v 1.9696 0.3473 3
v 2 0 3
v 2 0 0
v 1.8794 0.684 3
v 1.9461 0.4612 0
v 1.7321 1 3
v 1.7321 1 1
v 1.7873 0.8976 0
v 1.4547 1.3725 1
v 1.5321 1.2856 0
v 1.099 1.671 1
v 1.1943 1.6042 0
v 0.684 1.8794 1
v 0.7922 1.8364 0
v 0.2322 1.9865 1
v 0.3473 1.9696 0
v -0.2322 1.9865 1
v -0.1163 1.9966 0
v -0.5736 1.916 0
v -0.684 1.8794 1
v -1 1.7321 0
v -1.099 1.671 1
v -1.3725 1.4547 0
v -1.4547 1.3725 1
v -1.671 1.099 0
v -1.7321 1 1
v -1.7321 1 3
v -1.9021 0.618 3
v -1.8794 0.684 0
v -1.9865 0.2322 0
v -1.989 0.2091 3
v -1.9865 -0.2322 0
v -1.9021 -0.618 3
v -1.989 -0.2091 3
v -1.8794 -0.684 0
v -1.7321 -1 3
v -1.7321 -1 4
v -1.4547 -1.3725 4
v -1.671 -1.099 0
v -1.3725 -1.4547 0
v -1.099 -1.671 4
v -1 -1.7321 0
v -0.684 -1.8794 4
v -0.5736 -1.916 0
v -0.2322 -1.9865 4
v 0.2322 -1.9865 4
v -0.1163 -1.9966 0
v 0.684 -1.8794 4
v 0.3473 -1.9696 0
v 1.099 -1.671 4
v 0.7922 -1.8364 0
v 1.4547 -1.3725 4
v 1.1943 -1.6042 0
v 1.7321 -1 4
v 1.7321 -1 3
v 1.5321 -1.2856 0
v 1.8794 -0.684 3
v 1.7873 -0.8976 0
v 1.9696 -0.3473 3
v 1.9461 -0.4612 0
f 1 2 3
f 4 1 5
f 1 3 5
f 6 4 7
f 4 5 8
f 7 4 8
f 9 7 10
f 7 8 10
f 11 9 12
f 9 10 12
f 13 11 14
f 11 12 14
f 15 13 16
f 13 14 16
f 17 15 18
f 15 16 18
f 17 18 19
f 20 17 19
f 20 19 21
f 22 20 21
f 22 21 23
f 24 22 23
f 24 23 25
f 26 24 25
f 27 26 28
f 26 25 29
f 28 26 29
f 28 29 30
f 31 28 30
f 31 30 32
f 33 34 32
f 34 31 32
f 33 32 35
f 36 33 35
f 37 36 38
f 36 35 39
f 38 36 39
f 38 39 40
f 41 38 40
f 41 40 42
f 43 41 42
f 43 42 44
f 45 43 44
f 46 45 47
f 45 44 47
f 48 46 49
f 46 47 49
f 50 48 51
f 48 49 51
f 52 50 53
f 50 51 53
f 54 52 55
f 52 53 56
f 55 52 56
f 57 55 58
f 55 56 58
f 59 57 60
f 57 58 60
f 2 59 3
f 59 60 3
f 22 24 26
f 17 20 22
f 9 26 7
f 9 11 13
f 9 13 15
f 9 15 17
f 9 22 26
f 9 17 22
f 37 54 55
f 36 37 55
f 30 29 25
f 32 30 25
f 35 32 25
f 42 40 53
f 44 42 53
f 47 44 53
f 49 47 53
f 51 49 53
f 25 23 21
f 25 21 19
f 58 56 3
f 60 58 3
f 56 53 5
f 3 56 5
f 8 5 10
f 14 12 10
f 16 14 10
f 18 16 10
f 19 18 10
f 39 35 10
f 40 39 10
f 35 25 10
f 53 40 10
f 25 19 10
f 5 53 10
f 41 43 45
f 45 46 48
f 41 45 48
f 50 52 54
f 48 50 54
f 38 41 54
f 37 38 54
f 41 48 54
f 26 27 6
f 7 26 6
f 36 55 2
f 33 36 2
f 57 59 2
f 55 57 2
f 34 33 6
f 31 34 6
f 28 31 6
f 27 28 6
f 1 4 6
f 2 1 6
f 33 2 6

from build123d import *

# Parameters (mm, degrees)
SKETCH1_R           = 2
BOSS_EXTRUDE1_DEPTH = 4
BOSS_EXTRUDE2_DEPTH = 1
CUT_EXTRUDE1_DEPTH  = 3
CUT_EXTRUDE2_DEPTH  = 6


with BuildPart() as part:
    # Sketch1 → Boss-Extrude1 (new body)
    with BuildSketch(Plane.XY):
        Circle(SKETCH1_R)
    extrude(amount=BOSS_EXTRUDE1_DEPTH)

    # Sketch2 → Boss-Extrude2 (add)
    with BuildSketch(Plane.XY.offset(4)):
        with BuildLine():
            Line((-1.732050808, -1), (1.732050808, -1))
            ThreePointArc((1.732050808, -1), (0, -2), (-1.732050808, -1))
        make_face()
    extrude(amount=BOSS_EXTRUDE2_DEPTH)

    # Sketch3 → Cut-Extrude1 (cut)
    with BuildSketch(Plane.XY.offset(4)):
        with BuildLine():
            Line((-1.732050808, 1), (1.732050808, 1))
            ThreePointArc((1.732050808, 1), (0, 2), (-1.732050808, 1))
        make_face()
    extrude(amount=-CUT_EXTRUDE1_DEPTH, mode=Mode.SUBTRACT)

    # Sketch4 → Cut-Extrude2 (cut, symmetric)
    with BuildSketch(Plane(origin=(0, 0, 0), x_dir=(0, 0, -1), z_dir=(1, 0, 0))):
        Polygon((-4, -1), (-3, -1), (-3, 1), (-3, 1.7578402), (-5.763570066, 1.806323886), (-6.032923873, -1.975403573), (-4.341381962, -2.24475738), (-4, -2.24475738), align=None)
    extrude(amount=CUT_EXTRUDE2_DEPTH, both=True, mode=Mode.SUBTRACT)


solid = part.part
